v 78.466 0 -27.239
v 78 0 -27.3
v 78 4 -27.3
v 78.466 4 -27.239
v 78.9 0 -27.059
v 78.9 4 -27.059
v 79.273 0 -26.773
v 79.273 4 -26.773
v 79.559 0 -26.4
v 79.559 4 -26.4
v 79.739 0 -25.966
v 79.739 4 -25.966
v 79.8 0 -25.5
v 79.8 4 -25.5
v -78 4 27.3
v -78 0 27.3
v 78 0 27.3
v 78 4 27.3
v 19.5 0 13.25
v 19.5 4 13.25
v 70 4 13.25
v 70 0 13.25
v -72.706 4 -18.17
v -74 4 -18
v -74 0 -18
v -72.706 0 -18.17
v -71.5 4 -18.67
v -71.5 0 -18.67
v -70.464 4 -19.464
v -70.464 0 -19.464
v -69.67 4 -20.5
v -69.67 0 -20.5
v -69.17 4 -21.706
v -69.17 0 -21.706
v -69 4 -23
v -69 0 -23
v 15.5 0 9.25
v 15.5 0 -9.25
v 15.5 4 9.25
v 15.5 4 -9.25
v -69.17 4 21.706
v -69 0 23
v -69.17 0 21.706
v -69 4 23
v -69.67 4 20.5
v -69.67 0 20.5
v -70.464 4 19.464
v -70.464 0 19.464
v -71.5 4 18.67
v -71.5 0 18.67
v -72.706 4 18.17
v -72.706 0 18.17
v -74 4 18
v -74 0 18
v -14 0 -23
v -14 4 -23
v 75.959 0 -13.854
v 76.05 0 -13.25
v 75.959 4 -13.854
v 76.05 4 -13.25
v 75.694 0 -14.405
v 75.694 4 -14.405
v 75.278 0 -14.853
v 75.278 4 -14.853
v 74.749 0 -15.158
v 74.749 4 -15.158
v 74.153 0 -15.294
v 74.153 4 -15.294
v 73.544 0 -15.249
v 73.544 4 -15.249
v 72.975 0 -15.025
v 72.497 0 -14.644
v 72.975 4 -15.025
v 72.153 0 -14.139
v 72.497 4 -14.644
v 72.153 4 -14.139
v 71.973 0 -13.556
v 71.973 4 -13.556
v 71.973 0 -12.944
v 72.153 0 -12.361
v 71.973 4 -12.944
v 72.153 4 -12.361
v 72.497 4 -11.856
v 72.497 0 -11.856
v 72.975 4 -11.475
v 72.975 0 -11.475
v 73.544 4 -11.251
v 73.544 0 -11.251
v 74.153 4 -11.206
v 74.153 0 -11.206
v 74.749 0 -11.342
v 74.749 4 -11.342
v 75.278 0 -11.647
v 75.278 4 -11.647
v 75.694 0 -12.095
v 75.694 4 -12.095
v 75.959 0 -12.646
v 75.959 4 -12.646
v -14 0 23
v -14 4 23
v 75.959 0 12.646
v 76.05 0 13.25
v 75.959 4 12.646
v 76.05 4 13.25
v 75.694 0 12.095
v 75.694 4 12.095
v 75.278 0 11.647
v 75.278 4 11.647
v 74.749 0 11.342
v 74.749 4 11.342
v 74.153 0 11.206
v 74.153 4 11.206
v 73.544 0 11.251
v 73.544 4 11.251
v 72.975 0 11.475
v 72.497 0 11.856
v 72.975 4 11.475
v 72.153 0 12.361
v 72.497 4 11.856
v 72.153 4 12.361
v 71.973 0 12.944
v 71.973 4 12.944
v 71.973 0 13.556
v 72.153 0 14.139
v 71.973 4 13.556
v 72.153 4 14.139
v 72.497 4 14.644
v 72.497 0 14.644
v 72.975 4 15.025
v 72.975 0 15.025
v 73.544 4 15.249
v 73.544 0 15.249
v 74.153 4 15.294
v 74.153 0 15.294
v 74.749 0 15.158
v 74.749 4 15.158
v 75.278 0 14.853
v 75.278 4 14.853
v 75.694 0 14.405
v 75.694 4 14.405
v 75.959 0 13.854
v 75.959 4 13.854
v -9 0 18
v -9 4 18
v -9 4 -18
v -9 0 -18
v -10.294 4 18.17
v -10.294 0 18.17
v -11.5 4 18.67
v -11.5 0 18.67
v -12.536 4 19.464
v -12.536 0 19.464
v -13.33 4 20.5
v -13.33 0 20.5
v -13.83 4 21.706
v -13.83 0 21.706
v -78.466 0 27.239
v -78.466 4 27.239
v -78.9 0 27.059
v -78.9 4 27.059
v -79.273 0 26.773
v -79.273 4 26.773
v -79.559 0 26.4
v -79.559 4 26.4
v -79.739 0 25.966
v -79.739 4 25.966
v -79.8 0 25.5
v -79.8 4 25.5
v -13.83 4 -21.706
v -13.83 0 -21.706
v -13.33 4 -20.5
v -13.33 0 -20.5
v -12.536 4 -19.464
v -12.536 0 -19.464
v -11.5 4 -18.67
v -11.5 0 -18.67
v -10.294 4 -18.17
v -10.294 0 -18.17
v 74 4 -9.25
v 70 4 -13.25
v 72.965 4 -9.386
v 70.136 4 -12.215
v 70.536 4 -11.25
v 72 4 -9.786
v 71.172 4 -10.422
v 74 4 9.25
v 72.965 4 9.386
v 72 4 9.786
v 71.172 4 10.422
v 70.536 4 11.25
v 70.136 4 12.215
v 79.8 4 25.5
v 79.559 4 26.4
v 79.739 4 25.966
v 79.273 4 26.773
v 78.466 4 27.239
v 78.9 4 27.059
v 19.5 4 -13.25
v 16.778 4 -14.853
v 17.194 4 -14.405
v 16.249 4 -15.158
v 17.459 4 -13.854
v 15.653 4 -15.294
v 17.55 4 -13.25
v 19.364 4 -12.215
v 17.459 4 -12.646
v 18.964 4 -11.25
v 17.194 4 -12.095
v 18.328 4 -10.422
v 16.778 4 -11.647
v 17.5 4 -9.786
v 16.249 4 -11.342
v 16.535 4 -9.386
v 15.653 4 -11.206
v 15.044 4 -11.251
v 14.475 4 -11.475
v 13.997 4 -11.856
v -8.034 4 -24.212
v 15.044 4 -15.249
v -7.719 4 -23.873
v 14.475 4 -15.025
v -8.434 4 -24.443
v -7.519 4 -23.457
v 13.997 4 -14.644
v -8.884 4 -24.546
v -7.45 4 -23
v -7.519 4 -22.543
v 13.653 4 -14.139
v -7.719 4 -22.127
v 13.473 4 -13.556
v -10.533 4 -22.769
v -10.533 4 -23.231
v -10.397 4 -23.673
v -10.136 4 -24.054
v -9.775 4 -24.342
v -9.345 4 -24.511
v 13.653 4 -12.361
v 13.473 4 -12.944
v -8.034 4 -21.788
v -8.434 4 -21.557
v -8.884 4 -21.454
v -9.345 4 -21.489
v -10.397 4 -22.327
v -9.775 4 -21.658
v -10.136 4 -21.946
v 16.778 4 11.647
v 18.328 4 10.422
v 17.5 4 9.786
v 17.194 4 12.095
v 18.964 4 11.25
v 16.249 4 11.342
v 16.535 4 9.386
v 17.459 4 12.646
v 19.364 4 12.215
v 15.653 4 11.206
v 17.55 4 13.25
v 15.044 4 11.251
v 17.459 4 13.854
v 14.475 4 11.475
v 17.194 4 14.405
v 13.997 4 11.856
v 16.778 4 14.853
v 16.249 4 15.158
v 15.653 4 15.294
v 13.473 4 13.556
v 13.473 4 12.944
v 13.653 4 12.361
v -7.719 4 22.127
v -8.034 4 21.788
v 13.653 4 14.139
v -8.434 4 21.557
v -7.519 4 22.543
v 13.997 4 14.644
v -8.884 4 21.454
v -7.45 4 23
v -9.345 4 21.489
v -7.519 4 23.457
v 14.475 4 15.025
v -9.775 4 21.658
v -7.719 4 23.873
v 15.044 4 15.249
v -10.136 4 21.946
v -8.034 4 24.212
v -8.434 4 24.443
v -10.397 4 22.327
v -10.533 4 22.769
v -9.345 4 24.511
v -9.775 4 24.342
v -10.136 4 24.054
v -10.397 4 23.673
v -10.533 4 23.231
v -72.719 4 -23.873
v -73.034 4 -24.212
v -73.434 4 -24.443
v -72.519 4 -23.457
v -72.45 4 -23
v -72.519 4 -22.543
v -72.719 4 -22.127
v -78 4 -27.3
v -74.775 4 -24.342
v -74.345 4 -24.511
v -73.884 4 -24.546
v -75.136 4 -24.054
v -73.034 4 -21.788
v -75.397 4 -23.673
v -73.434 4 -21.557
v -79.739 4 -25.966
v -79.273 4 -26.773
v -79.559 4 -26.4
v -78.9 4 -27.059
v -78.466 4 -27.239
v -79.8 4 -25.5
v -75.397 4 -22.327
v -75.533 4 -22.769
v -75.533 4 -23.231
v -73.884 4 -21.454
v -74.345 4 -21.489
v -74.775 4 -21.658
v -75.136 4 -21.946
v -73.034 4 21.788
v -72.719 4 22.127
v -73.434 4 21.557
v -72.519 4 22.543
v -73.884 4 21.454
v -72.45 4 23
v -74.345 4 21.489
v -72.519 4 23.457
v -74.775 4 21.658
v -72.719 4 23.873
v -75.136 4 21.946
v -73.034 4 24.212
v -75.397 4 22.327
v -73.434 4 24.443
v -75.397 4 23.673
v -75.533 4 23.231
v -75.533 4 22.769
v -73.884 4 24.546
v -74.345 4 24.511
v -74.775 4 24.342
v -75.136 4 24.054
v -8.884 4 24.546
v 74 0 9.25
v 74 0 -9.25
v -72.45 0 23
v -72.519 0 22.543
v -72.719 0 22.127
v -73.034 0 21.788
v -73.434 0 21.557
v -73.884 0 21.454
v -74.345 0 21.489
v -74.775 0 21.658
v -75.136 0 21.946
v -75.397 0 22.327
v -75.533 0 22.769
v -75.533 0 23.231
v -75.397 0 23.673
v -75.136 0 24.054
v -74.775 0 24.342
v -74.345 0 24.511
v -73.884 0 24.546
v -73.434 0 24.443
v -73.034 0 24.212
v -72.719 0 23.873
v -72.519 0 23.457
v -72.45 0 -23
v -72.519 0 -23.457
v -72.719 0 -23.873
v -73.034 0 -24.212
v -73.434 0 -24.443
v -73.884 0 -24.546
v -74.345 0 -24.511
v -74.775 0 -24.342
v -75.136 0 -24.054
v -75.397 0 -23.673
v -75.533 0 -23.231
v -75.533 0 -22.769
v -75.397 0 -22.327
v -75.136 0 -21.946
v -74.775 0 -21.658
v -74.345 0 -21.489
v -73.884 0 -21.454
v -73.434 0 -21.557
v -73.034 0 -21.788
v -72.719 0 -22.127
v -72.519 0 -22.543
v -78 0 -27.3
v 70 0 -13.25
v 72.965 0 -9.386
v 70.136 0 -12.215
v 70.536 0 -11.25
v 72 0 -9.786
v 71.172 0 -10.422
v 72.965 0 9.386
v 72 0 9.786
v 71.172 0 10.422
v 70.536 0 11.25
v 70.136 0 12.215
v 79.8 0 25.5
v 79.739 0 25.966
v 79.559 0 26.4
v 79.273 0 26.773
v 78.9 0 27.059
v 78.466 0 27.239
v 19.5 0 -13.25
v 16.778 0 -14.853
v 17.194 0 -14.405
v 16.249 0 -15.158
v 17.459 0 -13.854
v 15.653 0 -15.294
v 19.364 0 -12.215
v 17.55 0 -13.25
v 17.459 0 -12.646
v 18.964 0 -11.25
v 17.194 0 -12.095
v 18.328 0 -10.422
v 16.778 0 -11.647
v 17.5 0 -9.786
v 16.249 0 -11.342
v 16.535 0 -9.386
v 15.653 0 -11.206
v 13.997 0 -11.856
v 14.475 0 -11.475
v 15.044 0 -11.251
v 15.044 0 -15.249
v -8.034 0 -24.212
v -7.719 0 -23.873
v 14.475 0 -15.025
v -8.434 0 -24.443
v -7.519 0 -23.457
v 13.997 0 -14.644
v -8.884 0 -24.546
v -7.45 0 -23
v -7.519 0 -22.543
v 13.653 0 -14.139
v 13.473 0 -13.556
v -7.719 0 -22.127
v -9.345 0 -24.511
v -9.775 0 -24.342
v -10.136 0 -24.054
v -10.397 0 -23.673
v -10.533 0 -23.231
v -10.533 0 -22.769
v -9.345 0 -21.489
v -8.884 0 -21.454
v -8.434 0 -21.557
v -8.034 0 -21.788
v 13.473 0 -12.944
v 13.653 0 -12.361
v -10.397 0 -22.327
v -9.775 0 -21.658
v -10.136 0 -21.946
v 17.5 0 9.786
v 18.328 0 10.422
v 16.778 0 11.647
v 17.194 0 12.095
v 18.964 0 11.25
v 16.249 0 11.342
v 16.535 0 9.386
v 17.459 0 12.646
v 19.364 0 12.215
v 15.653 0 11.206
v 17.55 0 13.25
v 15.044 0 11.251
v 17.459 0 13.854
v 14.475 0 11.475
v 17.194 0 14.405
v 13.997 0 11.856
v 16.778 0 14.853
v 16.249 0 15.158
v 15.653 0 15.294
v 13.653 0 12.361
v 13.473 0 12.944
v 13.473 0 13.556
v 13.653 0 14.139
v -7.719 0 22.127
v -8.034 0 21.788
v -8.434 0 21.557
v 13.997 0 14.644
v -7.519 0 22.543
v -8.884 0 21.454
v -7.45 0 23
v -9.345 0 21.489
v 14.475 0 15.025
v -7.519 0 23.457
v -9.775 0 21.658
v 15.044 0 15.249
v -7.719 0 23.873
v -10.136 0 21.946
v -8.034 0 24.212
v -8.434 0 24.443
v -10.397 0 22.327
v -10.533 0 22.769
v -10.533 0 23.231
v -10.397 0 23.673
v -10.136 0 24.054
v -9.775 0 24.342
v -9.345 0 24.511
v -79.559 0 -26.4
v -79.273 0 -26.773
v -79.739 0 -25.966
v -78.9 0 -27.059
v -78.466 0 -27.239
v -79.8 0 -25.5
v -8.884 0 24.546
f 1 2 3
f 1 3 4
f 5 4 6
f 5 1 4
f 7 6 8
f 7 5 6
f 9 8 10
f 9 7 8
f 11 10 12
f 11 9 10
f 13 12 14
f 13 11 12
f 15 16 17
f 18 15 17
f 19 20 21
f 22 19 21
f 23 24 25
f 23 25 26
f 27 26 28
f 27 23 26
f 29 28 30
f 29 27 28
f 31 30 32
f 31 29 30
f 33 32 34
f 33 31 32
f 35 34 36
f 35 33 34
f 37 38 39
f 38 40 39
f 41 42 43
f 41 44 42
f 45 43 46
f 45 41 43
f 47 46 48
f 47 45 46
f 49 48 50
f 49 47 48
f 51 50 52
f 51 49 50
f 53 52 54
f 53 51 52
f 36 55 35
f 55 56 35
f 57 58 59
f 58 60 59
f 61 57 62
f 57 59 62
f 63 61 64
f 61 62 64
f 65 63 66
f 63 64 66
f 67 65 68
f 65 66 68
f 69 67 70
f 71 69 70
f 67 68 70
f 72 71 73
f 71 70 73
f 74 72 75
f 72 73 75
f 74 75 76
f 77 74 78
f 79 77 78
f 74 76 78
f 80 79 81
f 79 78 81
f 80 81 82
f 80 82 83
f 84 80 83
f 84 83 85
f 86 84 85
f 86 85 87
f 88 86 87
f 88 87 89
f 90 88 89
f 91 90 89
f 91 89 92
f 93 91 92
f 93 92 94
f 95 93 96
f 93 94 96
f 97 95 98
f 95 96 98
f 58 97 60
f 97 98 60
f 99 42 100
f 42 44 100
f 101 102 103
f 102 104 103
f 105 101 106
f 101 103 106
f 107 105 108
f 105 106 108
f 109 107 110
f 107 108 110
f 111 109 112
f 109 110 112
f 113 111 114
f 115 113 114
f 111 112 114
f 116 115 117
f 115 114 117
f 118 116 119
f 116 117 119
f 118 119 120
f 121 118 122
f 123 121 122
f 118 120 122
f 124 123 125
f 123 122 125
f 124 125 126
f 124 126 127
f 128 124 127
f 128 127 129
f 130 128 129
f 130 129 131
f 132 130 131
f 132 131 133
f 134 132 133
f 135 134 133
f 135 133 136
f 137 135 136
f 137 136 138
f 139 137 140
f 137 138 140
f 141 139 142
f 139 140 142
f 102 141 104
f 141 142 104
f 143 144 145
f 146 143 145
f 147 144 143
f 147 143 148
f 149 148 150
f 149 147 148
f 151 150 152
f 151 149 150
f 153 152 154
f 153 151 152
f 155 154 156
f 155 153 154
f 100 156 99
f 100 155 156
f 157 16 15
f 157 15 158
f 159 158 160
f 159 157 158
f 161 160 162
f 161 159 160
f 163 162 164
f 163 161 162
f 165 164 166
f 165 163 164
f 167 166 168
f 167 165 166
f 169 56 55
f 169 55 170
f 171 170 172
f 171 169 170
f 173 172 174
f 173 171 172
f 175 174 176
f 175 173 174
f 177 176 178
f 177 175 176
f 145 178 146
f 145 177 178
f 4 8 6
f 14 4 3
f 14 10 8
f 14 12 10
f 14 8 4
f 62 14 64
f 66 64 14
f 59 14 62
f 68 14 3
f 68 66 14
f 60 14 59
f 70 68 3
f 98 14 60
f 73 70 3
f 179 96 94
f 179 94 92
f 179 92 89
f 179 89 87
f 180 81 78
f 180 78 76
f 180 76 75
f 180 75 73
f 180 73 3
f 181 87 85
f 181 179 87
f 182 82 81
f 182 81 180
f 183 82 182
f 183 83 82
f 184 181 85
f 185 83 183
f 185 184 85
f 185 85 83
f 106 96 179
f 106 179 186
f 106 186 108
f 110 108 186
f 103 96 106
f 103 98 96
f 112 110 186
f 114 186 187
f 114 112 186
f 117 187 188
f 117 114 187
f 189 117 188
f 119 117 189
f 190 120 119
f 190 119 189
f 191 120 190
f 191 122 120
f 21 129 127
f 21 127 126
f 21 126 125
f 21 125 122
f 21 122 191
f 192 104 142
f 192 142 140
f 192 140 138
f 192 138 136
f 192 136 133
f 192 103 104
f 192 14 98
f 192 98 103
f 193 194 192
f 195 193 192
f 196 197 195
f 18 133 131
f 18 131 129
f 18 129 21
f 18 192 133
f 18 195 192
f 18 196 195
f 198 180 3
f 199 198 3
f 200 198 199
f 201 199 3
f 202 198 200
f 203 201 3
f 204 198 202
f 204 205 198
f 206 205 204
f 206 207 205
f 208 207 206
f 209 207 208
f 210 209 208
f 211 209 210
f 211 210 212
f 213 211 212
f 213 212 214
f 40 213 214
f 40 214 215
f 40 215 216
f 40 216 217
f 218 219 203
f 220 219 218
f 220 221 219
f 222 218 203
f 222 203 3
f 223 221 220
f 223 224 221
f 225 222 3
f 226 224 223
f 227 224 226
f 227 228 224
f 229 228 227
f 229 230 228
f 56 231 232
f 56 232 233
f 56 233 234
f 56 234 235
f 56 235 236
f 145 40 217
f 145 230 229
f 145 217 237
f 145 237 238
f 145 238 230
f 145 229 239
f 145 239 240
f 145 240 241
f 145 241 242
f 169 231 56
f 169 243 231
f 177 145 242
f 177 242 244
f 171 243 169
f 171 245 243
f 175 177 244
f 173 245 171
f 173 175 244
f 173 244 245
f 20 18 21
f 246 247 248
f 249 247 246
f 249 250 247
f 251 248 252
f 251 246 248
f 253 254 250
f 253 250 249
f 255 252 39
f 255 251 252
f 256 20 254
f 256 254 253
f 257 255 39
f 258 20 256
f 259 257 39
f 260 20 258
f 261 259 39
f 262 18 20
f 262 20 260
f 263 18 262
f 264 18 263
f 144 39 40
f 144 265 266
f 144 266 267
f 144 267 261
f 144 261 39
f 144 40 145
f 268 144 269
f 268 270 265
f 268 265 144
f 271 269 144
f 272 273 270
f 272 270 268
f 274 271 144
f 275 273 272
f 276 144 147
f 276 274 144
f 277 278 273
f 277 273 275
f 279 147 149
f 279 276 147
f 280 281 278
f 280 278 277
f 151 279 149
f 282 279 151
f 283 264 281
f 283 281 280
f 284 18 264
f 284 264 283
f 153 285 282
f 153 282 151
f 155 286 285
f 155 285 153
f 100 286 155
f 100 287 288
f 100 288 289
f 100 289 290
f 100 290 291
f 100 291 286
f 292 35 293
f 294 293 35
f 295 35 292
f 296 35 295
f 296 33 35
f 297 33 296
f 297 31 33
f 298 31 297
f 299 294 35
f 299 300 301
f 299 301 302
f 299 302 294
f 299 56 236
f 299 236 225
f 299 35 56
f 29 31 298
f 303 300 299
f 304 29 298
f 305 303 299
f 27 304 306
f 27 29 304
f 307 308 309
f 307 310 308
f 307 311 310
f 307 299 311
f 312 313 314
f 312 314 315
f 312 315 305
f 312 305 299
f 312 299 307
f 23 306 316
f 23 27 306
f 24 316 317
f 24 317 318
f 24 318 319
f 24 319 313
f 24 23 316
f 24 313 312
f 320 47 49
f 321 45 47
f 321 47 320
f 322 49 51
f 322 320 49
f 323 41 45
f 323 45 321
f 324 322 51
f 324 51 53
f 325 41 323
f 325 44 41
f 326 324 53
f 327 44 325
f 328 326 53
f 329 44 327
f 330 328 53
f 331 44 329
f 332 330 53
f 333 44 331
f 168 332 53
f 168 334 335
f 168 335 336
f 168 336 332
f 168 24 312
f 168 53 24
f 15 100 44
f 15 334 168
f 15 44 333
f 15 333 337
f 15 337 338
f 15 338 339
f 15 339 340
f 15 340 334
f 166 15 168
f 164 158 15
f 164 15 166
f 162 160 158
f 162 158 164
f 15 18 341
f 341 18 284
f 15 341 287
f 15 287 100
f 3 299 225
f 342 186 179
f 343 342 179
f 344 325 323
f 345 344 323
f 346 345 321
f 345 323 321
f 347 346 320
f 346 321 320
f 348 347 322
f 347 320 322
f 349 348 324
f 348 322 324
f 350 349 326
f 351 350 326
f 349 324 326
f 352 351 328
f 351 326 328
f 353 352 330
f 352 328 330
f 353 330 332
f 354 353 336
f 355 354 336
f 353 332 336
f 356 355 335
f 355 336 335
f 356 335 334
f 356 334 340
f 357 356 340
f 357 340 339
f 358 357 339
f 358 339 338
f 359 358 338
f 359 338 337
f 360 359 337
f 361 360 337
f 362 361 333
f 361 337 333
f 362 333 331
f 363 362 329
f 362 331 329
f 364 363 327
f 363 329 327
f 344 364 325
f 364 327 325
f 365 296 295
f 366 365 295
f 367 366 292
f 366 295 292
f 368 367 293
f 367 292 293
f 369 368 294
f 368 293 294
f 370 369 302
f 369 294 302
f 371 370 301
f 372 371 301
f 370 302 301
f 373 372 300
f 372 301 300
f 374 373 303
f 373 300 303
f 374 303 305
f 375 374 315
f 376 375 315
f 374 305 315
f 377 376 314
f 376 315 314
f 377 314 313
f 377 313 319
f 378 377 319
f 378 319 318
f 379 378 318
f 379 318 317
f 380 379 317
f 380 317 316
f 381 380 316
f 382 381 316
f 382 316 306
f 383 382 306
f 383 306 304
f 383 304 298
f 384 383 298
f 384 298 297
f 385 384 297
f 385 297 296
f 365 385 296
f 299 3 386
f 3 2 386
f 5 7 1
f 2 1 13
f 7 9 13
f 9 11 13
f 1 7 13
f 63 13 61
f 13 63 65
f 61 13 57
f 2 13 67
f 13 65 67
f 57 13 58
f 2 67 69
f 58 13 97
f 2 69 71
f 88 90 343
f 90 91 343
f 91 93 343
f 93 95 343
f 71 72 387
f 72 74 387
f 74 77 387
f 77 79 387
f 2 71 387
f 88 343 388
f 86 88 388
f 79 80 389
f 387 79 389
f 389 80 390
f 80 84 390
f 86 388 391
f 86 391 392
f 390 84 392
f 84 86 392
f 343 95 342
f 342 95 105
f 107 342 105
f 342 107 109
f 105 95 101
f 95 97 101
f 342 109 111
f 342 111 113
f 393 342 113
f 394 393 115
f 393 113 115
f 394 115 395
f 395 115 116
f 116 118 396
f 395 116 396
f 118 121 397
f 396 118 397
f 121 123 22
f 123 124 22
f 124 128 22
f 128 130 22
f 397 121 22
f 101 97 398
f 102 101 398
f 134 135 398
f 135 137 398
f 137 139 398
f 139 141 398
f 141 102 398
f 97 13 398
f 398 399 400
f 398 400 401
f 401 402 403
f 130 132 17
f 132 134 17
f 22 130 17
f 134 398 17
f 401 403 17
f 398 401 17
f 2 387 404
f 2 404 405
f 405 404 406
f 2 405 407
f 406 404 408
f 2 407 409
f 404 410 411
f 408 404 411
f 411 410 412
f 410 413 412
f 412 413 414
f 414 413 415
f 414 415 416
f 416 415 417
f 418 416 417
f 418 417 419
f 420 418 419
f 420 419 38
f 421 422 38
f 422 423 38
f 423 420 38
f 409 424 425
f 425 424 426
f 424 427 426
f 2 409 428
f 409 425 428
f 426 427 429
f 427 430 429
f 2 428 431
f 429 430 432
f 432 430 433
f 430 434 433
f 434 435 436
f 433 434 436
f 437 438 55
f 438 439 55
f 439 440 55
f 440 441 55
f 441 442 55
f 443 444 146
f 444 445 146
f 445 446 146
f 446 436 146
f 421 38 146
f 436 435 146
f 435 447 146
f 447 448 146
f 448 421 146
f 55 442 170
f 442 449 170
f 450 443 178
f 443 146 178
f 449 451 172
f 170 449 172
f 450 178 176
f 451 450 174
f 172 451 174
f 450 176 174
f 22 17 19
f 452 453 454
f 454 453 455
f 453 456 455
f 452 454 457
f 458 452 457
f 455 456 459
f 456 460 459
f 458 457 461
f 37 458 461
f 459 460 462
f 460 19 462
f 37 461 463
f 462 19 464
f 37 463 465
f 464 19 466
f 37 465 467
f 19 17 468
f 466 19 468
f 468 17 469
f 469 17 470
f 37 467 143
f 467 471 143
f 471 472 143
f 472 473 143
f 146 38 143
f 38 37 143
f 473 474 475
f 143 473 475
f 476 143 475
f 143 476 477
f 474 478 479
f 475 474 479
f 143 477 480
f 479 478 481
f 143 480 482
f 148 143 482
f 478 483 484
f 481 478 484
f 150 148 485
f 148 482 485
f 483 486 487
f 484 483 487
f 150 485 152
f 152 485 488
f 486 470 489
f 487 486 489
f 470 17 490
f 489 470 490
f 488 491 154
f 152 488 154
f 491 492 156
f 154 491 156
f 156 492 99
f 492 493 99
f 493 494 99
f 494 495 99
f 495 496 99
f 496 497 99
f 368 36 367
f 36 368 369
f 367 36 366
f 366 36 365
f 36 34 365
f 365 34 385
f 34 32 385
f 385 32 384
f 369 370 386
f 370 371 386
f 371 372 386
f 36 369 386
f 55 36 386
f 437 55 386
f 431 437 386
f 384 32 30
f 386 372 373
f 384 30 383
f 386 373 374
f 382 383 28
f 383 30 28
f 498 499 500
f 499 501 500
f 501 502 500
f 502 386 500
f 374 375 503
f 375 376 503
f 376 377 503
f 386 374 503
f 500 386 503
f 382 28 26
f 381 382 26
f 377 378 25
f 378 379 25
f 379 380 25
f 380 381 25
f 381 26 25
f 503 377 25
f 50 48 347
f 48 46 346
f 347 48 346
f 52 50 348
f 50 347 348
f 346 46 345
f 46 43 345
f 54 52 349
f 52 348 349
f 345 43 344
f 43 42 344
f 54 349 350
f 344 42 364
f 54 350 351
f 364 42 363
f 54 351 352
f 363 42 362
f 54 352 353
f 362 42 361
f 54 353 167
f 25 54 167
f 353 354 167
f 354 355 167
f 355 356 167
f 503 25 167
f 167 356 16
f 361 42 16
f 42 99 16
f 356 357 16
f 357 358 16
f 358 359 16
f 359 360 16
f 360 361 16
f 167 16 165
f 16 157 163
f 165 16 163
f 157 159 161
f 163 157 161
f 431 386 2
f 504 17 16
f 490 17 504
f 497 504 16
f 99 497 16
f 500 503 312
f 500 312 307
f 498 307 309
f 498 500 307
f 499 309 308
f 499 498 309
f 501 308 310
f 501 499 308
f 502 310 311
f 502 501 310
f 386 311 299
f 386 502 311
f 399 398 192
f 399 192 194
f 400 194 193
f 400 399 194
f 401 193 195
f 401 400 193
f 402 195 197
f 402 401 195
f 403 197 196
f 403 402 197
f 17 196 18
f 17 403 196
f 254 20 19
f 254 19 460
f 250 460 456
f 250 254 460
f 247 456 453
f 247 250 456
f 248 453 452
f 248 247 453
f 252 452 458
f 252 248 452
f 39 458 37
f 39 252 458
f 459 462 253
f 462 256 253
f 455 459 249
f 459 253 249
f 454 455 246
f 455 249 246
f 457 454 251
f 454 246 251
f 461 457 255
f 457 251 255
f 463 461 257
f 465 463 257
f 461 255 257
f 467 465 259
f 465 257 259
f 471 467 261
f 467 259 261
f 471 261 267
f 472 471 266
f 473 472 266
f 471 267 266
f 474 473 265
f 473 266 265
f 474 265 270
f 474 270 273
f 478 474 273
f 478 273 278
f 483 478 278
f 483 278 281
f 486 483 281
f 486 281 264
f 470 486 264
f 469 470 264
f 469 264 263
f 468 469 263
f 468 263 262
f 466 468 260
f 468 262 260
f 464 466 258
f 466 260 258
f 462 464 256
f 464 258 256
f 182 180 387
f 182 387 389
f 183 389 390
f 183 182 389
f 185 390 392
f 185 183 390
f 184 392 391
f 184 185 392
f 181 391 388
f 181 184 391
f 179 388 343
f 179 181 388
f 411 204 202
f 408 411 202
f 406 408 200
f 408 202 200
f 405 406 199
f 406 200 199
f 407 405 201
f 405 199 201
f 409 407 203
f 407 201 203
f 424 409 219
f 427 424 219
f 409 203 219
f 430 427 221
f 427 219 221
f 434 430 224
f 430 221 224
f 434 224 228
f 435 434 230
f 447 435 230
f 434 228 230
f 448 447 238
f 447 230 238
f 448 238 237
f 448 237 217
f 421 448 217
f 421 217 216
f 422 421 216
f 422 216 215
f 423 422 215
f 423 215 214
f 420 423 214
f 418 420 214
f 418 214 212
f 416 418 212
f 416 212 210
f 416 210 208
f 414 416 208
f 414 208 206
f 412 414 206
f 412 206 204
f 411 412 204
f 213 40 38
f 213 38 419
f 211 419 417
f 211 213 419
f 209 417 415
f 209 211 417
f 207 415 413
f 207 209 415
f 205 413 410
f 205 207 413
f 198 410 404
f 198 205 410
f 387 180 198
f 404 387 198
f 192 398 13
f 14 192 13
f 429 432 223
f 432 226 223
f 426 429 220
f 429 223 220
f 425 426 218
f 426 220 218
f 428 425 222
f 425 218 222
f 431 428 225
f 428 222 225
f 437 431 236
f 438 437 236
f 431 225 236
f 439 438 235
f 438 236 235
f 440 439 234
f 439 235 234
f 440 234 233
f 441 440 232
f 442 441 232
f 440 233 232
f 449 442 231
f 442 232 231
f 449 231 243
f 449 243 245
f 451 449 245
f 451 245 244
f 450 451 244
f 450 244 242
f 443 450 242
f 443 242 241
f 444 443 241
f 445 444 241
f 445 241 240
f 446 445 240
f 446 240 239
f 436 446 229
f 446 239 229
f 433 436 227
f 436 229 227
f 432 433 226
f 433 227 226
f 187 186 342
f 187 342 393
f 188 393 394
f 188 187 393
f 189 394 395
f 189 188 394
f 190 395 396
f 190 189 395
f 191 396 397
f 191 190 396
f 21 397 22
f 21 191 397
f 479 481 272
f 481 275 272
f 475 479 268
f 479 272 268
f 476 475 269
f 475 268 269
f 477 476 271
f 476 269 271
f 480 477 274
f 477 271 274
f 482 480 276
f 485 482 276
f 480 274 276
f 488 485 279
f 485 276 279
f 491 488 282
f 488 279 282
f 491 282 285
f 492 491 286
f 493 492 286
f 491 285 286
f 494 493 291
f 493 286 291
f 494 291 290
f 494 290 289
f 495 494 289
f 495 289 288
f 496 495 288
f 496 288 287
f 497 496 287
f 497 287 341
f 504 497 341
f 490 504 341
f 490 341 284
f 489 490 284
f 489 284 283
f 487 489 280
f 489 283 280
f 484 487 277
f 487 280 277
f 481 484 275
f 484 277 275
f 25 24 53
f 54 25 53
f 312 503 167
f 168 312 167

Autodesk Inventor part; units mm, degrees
ref_plane "YZ Plane" through (0, 0, 0) normal (1, 0, 0) x (0, 1, 0)
ref_plane "XZ Plane" through (0, 0, 0) normal (0, 1, 0) x (-1, 0, 0)
ref_plane "XY Plane" through (0, 0, 0) normal (0, 0, 1) x (1, 0, 0)
sketch "Sketch1" plane through (0, 0, 0) normal (0, 1, 0) x (-1, 0, 0)
  line L0 (-80, 27.5) -> (80, 27.5)
  line L1 (80, 27.5) -> (80, -27.5)
  line L2 (80, -27.5) -> (-80, -27.5)
  line L3 (-80, -27.5) -> (-80, 27.5)
  line L4 (-80, 27.5) -> (80, -27.5) construction
  line L5 (80, 27.5) -> (-80, -27.5) construction
  point P0 (0, 0)
  dimension "d0" = 160
  dimension "d1" = 55
extrude "Extrusion1" add sketch "Sketch1" along normal blind 4
sketch "Sketch2" plane through (0, 4, 0) normal (0, 1, 0) x (1, 0, 0)
  line L0 (80, 27.5) -> (-80, 27.5) projected
  line L1 (-80, 27.5) -> (-80, -27.5) projected
  line L2 (-80, -27.5) -> (80, -27.5) projected
  line L3 (80, -27.5) -> (80, 27.5) projected
  line L4 (-74, -23) -> (-9, -23)
  line L5 (-9, -23) -> (-9, 23)
  line L6 (-9, 23) -> (-74, 23)
  line L7 (-74, 23) -> (-74, -23)
  line L8 (-74, -23) -> (-74, -27.5)
  line L9 (-74, 23) -> (-74, 27.5)
  circle A0 centre (-74, -23) radius 1.55
  circle A1 centre (-74, 23) radius 1.55
  circle A2 centre (-9, -23) radius 1.55
  circle A3 centre (-9, 23) radius 1.55
  circle A4 centre (-74, 23) radius 5
  circle A5 centre (-9, 23) radius 5
  circle A6 centre (-74, -23) radius 5
  circle A7 centre (-9, -23) radius 5
  line L10 (-80, 0) -> (80, 0) construction
  line L11 (15.5, -13.25) -> (74, -13.25)
  line L12 (74, -13.25) -> (74, 13.25)
  line L13 (74, 13.25) -> (15.5, 13.25)
  line L14 (15.5, 13.25) -> (15.5, -13.25)
  line L15 (15.5, -13.25) -> (74, 13.25) construction
  line L16 (74, -13.25) -> (15.5, 13.25) construction
  circle A8 centre (15.5, -13.25) radius 2.05
  circle A9 centre (15.5, 13.25) radius 2.05
  circle A10 centre (74, 13.25) radius 2.05
  circle A11 centre (74, -13.25) radius 2.05
  circle A12 centre (15.5, 13.25) radius 4
  circle A13 centre (15.5, -13.25) radius 4
  circle A14 centre (74, -13.25) radius 4
  circle A15 centre (74, 13.25) radius 4
  point P0 (0, 0)
  point P1 (44.75, 0)
  point P2 (74, 9.25)
  point P3 (70, 13.25)
  point P4 (19.5, 13.25)
  point P5 (15.5, 9.25)
  point P6 (15.5, -9.25)
  point P7 (19.5, -13.25)
  point P8 (70, -13.25)
  point P9 (74, -9.25)
  point P10 (-14, -23)
  point P11 (-9, -18)
  point P12 (-9, 18)
  point P13 (-14, 23)
  point P14 (-69, 23)
  point P15 (-74, 18)
  point P16 (-74, -18)
  point P17 (-69, -23)
  dimension "d4" = 65
  dimension "d5" = 46
  dimension "d6" = 3.1
  dimension "d7" = 3.1
  dimension "d8" = 3.1
  dimension "d9" = 3.1
  dimension "d10" = 6
  dimension "d11" = 10
  dimension "d12" = 10
  dimension "d13" = 10
  dimension "d14" = 10
  dimension "d15" = 58.5
  dimension "d16" = 26.5
  dimension "d17" = 6
  dimension "d18" = 4.1
  dimension "d19" = 4.1
  dimension "d20" = 4.1
  dimension "d21" = 4.1
  dimension "d22" = 8
  dimension "d23" = 8
  dimension "d24" = 8
  dimension "d25" = 8
extrude "Extrusion2" cut sketch "Sketch2" against normal blind 10 contours A5 L5 A7 L4 A6 L7 A4 L6 | A3 L5 L6 | L6 L5 A3 | A1 L6 L9 | L9 L7 A1 | A1 L7 L6 | A2 L4 L5 | L5 L4 A2 | A0 L7 L8 | L8 L4 A0 | L4 L7 A0 | L14 A8 L11 | L11 A8 L14 | A13 L14 A12 L13 A15 L12 A14 L11 | A11 L12 L11 | L11 L12 A11 | A9 L13 L14 | L14 L13 A9 | A10 L13 L12 | L12 L13 A10
fillet "Fillet1" radius 2 4 edges at (-80, 2, 27.5) (80, 2, 27.5) (80, 2, -27.5) (-80, 2, -27.5)
sketch "Sketch3" plane through (0, 0, 0) normal (0, -1, 0) x (1, 0, 0)
  circle A0 centre (-9, 23) radius 1.55 projected
  circle A1 centre (15.5, -13.25) radius 2.05 projected
  circle A2 centre (-74, -23) radius 1.55 projected
  circle A3 centre (74, -13.25) radius 2.05 projected
  arc A4 (19.5, -13.25) -> (15.5, -9.25) centre (15.5, -13.25) ccw projected
  line L0 (15.5, -9.25) -> (15.5, 9.25) projected
  arc A5 (15.5, 9.25) -> (19.5, 13.25) centre (15.5, 13.25) ccw projected
  line L1 (19.5, 13.25) -> (70, 13.25) projected
  arc A6 (70, 13.25) -> (74, 9.25) centre (74, 13.25) ccw projected
  line L2 (74, 9.25) -> (74, -9.25) projected
  arc A7 (74, -9.25) -> (70, -13.25) centre (74, -13.25) ccw projected
  line L3 (70, -13.25) -> (19.5, -13.25) projected
  circle A8 centre (15.5, 13.25) radius 2.05 projected
  circle A9 centre (-9, -23) radius 1.55 projected
  circle A10 centre (-74, 23) radius 1.55 projected
  circle A11 centre (74, 13.25) radius 2.05 projected
  arc A12 (-9, -18) -> (-14, -23) centre (-9, -23) ccw projected
  line L4 (-14, -23) -> (-69, -23) projected
  arc A13 (-69, -23) -> (-74, -18) centre (-74, -23) ccw projected
  line L5 (-74, -18) -> (-74, 18) projected
  arc A14 (-74, 18) -> (-69, 23) centre (-74, 23) ccw projected
  line L6 (-69, 23) -> (-14, 23) projected
  arc A15 (-14, 23) -> (-9, 18) centre (-9, 23) ccw projected
  line L7 (-9, 18) -> (-9, -18) projected
  arc A16 (-80, -25.5) -> (-78, -27.5) centre (-78, -25.5) ccw projected
  line L8 (78, -27.5) -> (-78, -27.5) projected
  arc A17 (78, -27.5) -> (80, -25.5) centre (78, -25.5) ccw projected
  line L9 (80, 25.5) -> (80, -25.5) projected
  arc A18 (80, 25.5) -> (78, 27.5) centre (78, 25.5) ccw projected
  line L10 (-78, 27.5) -> (78, 27.5) projected
  arc A19 (-78, 27.5) -> (-80, 25.5) centre (-78, 25.5) ccw projected
  line L11 (-80, -25.5) -> (-80, 25.5) projected
  arc A20 (79.8, 25.5) -> (78, 27.3) centre (78, 25.5) ccw
  line L12 (79.8, 25.5) -> (79.8, -25.5)
  arc A21 (78, -27.3) -> (79.8, -25.5) centre (78, -25.5) ccw
  line L13 (78, -27.3) -> (-78, -27.3)
  arc A22 (-79.8, -25.5) -> (-78, -27.3) centre (-78, -25.5) ccw
  line L14 (-79.8, -25.5) -> (-79.8, 25.5)
  arc A23 (-78, 27.3) -> (-79.8, 25.5) centre (-78, 25.5) ccw
  line L15 (-78, 27.3) -> (78, 27.3)
  point P0 (0, 0)
  dimension "d29" = 0.2
extrude "offset" cut sketch "Sketch3" against normal through all contours L11 A19 L10 A18 L9 A17 L8 A16
properties part number "motherboard"
